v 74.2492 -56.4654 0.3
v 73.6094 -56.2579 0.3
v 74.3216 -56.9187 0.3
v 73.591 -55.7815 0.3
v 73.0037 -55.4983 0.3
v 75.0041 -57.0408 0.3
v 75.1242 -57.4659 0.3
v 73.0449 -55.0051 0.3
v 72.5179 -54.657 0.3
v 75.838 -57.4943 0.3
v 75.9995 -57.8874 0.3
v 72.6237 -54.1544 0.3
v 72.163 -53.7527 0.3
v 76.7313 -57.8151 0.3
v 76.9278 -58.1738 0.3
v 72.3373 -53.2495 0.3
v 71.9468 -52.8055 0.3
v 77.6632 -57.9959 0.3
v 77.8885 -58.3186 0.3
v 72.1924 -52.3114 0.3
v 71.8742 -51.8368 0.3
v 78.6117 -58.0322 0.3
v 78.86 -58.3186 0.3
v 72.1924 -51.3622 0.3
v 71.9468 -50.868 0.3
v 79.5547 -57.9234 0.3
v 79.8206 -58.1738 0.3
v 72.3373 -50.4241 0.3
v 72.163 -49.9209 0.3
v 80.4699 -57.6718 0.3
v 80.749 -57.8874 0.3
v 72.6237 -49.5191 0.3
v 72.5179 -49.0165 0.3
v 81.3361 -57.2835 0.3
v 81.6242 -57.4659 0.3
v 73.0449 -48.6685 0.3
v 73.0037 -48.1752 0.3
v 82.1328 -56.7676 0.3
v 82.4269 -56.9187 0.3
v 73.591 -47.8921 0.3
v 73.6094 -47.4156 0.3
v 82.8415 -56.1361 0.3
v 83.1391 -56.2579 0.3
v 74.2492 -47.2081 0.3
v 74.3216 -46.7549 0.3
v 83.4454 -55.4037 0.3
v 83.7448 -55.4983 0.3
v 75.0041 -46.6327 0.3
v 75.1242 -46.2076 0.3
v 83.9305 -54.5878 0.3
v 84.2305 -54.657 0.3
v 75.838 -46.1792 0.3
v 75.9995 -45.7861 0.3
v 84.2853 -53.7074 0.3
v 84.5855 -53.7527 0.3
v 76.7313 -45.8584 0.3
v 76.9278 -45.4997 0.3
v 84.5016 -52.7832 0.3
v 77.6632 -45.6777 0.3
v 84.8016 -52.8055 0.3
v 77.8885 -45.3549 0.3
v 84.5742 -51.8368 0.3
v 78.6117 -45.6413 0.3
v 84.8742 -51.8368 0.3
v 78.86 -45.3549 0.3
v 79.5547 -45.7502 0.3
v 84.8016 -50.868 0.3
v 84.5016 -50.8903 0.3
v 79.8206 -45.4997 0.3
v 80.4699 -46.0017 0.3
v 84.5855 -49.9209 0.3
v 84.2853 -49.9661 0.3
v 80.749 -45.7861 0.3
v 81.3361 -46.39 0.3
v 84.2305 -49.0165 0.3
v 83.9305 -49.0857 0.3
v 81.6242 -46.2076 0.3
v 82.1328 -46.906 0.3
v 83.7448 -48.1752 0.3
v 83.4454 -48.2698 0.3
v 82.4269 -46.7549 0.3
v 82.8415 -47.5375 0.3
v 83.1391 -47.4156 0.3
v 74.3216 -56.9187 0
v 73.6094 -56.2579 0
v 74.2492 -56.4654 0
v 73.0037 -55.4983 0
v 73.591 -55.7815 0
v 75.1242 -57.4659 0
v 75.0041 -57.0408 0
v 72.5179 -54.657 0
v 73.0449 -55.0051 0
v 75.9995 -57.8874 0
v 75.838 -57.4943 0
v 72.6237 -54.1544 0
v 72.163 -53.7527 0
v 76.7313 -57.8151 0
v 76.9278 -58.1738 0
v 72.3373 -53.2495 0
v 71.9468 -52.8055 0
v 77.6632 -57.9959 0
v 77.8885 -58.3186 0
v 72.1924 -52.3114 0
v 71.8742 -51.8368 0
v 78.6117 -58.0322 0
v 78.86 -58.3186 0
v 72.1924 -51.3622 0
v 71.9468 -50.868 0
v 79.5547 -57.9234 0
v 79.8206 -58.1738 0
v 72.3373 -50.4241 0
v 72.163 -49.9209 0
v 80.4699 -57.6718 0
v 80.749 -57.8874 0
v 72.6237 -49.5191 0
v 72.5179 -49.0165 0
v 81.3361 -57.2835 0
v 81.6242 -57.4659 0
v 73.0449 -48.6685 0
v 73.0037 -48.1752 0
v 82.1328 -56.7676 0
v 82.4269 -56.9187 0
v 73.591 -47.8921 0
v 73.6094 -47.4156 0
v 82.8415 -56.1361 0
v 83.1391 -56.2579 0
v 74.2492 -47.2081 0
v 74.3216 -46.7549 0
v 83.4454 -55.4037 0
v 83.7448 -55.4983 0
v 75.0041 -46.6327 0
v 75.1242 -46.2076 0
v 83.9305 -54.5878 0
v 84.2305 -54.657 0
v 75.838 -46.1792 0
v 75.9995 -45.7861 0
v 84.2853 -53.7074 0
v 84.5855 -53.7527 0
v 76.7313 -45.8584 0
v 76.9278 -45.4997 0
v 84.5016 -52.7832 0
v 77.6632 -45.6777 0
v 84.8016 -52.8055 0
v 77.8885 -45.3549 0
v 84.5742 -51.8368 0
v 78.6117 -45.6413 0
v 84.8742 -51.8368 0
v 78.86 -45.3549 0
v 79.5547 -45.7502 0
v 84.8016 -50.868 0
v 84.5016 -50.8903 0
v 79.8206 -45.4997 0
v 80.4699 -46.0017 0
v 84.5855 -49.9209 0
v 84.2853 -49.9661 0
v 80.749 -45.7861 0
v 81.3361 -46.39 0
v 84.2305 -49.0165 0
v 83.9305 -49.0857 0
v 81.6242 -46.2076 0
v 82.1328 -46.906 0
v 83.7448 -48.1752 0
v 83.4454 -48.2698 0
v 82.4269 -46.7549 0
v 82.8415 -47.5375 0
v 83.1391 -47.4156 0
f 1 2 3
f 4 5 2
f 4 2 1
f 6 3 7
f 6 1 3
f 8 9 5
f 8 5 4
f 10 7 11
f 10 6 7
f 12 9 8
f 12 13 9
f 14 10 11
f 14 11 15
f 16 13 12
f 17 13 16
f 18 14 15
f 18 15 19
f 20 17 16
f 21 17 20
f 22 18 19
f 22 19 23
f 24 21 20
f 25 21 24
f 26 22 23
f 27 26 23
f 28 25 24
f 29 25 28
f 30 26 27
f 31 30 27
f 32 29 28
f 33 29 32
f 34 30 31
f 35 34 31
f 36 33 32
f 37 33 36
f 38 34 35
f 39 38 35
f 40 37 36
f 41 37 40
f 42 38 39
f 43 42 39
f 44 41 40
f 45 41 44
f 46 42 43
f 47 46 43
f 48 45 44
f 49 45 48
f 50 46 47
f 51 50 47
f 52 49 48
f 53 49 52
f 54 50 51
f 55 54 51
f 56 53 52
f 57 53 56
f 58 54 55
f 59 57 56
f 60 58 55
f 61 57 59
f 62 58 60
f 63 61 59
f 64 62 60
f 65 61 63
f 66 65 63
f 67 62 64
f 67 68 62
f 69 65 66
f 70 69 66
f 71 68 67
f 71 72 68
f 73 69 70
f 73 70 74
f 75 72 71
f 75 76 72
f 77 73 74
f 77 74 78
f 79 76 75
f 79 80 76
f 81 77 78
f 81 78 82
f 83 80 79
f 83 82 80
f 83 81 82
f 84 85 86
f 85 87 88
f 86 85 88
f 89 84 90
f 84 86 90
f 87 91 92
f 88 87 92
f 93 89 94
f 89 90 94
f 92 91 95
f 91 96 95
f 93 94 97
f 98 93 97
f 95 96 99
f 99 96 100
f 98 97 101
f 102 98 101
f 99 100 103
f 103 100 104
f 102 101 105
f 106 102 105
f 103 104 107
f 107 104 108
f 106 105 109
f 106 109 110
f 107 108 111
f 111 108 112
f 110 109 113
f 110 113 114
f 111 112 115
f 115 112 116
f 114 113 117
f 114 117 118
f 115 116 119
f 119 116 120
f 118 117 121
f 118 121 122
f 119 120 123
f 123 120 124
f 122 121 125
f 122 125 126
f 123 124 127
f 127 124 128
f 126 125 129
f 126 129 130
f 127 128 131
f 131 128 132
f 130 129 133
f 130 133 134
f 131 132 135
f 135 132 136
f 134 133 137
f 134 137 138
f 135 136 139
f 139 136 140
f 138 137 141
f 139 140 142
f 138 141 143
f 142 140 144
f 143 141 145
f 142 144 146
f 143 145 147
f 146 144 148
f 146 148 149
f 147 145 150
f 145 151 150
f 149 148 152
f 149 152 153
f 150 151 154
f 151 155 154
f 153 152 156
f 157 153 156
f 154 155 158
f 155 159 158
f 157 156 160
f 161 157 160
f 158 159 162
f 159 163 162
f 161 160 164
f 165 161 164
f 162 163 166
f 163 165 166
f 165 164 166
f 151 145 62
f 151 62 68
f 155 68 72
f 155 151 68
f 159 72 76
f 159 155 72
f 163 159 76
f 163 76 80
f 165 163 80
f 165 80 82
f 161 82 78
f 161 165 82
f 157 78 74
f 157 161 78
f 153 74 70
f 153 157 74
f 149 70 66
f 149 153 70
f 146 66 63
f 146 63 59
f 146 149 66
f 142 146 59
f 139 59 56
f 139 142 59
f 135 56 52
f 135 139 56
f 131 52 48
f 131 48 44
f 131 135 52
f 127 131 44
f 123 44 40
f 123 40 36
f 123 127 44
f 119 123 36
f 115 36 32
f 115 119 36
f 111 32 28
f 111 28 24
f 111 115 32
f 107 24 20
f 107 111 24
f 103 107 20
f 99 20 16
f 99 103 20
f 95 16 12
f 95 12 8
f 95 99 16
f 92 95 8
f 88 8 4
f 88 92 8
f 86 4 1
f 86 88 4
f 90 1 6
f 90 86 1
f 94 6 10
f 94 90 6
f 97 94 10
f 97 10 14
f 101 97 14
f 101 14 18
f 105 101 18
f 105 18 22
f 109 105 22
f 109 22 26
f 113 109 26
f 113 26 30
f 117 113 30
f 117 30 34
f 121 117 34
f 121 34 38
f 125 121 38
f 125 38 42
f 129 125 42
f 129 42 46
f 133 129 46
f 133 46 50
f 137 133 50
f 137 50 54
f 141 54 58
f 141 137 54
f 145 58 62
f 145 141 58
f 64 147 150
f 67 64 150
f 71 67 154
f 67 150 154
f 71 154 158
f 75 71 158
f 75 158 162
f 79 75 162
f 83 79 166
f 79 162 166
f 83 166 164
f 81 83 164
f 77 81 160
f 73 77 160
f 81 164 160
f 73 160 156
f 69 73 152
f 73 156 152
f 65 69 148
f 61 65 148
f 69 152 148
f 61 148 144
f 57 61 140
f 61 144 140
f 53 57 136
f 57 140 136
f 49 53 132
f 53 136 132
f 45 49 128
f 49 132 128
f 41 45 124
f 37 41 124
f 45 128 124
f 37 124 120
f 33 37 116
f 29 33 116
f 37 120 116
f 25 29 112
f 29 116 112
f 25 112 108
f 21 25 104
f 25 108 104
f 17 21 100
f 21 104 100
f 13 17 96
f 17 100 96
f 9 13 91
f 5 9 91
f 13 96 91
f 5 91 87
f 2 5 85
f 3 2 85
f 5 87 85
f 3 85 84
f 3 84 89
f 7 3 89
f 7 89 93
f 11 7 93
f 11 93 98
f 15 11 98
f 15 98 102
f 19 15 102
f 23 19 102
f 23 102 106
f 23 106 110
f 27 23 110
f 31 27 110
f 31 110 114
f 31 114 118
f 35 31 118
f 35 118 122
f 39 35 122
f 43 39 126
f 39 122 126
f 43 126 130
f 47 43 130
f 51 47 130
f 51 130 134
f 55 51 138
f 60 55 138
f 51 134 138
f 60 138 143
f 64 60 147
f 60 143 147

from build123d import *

# Parameters (mm, degrees)
F1_W     = 180
F1_H     = 180
F1_W_2   = 179.4
F1_H_2   = 179.4
F2_DEPTH = 0.3
F1_W_3   = 129.7133469
F1_H_3   = 140
F1_W_4   = 129.1133469
F1_H_4   = 139.4
F1_R     = 6.5
F1_R_2   = 6.2
F1_W_5   = 80
F1_H_5   = 80


with BuildPart() as f2:
    # F1 (on Top) → F2 (new body)
    with BuildSketch(Plane.XY):
        with Locations((-1.4824382961, 17.8632308638)):
            Rectangle(F1_W, F1_H)
        with Locations((-1.4824382961, 17.8632308638)):
            Rectangle(F1_W_2, F1_H_2, mode=Mode.SUBTRACT)
    extrude(amount=F2_DEPTH)


with BuildPart() as f2b:
    # F1 (on Top) → F2, piece 2 (new body)
    with BuildSketch(Plane.XY):
        Polygon((-81.3541731706, 97.8632308638), (-81.4824382961, 97.8632308638), (-81.4824382961, 95.4210562907), (-81.1824382961, 95.666005265), (-81.1824382961, 97.5632308638), (-79.8844793249, 97.5632308638), align=None)
        Polygon((-79.8541731706, 97.8632308638), (-81.3541731706, 97.8632308638), (-79.8844793249, 97.5632308638), (-78.3844793249, 97.5632308638), align=None)
        Polygon((68.2309086039, 97.8632308638), (-79.8541731706, 97.8632308638), (-78.3844793249, 97.5632308638), (67.9309086039, 97.5632308638), (67.9309086039, -61.8367691362), (-81.1824382961, -61.8367691362), (-81.1824382961, 95.2787069303), (-81.4824382961, 95.0337579561), (-81.4824382961, -62.1367691362), (68.2309086039, -62.1367691362), align=None)
        Polygon((-87.8824382961, 99.1958074024), (-81.3541731706, 97.8632308638), (-79.8541731706, 97.8632308638), (-88.1824382961, 99.5632308638), (-88.1824382961, 89.5632308638), (-81.4824382961, 95.0337579561), (-81.4824382961, 95.4210562907), (-87.8824382961, 90.1954781727), align=None)
    extrude(amount=F2_DEPTH)


with BuildPart() as f2c:
    # F1 (on Top) → F2, piece 3 (new body)
    with BuildSketch(Plane.XY):
        with Locations((-6.6257648461, 17.8632308638)):
            Rectangle(F1_W_3, F1_H_3)
        with Locations((-6.6257648461, 17.8632308638)):
            Rectangle(F1_W_4, F1_H_4, mode=Mode.SUBTRACT)
    extrude(amount=F2_DEPTH)


with BuildPart() as f2d:
    # F1 (on Top) → F2, piece 4 (new body)
    with BuildSketch(Plane.XY):
        with Locations((78.3742351539, -51.8367691362)):
            Circle(F1_R)
        with Locations((78.3742351539, -51.8367691362)):
            Circle(F1_R_2, mode=Mode.SUBTRACT)
    extrude(amount=F2_DEPTH)


with BuildPart() as f2e:
    # F1 (on Top) → F2, piece 5 (new body)
    with BuildSketch(Plane.XY):
        with Locations((-1.4824382961, 17.8632308638)):
            Rectangle(F1_W_5, F1_H_5)
    extrude(amount=F2_DEPTH)


solid = f2d.part
